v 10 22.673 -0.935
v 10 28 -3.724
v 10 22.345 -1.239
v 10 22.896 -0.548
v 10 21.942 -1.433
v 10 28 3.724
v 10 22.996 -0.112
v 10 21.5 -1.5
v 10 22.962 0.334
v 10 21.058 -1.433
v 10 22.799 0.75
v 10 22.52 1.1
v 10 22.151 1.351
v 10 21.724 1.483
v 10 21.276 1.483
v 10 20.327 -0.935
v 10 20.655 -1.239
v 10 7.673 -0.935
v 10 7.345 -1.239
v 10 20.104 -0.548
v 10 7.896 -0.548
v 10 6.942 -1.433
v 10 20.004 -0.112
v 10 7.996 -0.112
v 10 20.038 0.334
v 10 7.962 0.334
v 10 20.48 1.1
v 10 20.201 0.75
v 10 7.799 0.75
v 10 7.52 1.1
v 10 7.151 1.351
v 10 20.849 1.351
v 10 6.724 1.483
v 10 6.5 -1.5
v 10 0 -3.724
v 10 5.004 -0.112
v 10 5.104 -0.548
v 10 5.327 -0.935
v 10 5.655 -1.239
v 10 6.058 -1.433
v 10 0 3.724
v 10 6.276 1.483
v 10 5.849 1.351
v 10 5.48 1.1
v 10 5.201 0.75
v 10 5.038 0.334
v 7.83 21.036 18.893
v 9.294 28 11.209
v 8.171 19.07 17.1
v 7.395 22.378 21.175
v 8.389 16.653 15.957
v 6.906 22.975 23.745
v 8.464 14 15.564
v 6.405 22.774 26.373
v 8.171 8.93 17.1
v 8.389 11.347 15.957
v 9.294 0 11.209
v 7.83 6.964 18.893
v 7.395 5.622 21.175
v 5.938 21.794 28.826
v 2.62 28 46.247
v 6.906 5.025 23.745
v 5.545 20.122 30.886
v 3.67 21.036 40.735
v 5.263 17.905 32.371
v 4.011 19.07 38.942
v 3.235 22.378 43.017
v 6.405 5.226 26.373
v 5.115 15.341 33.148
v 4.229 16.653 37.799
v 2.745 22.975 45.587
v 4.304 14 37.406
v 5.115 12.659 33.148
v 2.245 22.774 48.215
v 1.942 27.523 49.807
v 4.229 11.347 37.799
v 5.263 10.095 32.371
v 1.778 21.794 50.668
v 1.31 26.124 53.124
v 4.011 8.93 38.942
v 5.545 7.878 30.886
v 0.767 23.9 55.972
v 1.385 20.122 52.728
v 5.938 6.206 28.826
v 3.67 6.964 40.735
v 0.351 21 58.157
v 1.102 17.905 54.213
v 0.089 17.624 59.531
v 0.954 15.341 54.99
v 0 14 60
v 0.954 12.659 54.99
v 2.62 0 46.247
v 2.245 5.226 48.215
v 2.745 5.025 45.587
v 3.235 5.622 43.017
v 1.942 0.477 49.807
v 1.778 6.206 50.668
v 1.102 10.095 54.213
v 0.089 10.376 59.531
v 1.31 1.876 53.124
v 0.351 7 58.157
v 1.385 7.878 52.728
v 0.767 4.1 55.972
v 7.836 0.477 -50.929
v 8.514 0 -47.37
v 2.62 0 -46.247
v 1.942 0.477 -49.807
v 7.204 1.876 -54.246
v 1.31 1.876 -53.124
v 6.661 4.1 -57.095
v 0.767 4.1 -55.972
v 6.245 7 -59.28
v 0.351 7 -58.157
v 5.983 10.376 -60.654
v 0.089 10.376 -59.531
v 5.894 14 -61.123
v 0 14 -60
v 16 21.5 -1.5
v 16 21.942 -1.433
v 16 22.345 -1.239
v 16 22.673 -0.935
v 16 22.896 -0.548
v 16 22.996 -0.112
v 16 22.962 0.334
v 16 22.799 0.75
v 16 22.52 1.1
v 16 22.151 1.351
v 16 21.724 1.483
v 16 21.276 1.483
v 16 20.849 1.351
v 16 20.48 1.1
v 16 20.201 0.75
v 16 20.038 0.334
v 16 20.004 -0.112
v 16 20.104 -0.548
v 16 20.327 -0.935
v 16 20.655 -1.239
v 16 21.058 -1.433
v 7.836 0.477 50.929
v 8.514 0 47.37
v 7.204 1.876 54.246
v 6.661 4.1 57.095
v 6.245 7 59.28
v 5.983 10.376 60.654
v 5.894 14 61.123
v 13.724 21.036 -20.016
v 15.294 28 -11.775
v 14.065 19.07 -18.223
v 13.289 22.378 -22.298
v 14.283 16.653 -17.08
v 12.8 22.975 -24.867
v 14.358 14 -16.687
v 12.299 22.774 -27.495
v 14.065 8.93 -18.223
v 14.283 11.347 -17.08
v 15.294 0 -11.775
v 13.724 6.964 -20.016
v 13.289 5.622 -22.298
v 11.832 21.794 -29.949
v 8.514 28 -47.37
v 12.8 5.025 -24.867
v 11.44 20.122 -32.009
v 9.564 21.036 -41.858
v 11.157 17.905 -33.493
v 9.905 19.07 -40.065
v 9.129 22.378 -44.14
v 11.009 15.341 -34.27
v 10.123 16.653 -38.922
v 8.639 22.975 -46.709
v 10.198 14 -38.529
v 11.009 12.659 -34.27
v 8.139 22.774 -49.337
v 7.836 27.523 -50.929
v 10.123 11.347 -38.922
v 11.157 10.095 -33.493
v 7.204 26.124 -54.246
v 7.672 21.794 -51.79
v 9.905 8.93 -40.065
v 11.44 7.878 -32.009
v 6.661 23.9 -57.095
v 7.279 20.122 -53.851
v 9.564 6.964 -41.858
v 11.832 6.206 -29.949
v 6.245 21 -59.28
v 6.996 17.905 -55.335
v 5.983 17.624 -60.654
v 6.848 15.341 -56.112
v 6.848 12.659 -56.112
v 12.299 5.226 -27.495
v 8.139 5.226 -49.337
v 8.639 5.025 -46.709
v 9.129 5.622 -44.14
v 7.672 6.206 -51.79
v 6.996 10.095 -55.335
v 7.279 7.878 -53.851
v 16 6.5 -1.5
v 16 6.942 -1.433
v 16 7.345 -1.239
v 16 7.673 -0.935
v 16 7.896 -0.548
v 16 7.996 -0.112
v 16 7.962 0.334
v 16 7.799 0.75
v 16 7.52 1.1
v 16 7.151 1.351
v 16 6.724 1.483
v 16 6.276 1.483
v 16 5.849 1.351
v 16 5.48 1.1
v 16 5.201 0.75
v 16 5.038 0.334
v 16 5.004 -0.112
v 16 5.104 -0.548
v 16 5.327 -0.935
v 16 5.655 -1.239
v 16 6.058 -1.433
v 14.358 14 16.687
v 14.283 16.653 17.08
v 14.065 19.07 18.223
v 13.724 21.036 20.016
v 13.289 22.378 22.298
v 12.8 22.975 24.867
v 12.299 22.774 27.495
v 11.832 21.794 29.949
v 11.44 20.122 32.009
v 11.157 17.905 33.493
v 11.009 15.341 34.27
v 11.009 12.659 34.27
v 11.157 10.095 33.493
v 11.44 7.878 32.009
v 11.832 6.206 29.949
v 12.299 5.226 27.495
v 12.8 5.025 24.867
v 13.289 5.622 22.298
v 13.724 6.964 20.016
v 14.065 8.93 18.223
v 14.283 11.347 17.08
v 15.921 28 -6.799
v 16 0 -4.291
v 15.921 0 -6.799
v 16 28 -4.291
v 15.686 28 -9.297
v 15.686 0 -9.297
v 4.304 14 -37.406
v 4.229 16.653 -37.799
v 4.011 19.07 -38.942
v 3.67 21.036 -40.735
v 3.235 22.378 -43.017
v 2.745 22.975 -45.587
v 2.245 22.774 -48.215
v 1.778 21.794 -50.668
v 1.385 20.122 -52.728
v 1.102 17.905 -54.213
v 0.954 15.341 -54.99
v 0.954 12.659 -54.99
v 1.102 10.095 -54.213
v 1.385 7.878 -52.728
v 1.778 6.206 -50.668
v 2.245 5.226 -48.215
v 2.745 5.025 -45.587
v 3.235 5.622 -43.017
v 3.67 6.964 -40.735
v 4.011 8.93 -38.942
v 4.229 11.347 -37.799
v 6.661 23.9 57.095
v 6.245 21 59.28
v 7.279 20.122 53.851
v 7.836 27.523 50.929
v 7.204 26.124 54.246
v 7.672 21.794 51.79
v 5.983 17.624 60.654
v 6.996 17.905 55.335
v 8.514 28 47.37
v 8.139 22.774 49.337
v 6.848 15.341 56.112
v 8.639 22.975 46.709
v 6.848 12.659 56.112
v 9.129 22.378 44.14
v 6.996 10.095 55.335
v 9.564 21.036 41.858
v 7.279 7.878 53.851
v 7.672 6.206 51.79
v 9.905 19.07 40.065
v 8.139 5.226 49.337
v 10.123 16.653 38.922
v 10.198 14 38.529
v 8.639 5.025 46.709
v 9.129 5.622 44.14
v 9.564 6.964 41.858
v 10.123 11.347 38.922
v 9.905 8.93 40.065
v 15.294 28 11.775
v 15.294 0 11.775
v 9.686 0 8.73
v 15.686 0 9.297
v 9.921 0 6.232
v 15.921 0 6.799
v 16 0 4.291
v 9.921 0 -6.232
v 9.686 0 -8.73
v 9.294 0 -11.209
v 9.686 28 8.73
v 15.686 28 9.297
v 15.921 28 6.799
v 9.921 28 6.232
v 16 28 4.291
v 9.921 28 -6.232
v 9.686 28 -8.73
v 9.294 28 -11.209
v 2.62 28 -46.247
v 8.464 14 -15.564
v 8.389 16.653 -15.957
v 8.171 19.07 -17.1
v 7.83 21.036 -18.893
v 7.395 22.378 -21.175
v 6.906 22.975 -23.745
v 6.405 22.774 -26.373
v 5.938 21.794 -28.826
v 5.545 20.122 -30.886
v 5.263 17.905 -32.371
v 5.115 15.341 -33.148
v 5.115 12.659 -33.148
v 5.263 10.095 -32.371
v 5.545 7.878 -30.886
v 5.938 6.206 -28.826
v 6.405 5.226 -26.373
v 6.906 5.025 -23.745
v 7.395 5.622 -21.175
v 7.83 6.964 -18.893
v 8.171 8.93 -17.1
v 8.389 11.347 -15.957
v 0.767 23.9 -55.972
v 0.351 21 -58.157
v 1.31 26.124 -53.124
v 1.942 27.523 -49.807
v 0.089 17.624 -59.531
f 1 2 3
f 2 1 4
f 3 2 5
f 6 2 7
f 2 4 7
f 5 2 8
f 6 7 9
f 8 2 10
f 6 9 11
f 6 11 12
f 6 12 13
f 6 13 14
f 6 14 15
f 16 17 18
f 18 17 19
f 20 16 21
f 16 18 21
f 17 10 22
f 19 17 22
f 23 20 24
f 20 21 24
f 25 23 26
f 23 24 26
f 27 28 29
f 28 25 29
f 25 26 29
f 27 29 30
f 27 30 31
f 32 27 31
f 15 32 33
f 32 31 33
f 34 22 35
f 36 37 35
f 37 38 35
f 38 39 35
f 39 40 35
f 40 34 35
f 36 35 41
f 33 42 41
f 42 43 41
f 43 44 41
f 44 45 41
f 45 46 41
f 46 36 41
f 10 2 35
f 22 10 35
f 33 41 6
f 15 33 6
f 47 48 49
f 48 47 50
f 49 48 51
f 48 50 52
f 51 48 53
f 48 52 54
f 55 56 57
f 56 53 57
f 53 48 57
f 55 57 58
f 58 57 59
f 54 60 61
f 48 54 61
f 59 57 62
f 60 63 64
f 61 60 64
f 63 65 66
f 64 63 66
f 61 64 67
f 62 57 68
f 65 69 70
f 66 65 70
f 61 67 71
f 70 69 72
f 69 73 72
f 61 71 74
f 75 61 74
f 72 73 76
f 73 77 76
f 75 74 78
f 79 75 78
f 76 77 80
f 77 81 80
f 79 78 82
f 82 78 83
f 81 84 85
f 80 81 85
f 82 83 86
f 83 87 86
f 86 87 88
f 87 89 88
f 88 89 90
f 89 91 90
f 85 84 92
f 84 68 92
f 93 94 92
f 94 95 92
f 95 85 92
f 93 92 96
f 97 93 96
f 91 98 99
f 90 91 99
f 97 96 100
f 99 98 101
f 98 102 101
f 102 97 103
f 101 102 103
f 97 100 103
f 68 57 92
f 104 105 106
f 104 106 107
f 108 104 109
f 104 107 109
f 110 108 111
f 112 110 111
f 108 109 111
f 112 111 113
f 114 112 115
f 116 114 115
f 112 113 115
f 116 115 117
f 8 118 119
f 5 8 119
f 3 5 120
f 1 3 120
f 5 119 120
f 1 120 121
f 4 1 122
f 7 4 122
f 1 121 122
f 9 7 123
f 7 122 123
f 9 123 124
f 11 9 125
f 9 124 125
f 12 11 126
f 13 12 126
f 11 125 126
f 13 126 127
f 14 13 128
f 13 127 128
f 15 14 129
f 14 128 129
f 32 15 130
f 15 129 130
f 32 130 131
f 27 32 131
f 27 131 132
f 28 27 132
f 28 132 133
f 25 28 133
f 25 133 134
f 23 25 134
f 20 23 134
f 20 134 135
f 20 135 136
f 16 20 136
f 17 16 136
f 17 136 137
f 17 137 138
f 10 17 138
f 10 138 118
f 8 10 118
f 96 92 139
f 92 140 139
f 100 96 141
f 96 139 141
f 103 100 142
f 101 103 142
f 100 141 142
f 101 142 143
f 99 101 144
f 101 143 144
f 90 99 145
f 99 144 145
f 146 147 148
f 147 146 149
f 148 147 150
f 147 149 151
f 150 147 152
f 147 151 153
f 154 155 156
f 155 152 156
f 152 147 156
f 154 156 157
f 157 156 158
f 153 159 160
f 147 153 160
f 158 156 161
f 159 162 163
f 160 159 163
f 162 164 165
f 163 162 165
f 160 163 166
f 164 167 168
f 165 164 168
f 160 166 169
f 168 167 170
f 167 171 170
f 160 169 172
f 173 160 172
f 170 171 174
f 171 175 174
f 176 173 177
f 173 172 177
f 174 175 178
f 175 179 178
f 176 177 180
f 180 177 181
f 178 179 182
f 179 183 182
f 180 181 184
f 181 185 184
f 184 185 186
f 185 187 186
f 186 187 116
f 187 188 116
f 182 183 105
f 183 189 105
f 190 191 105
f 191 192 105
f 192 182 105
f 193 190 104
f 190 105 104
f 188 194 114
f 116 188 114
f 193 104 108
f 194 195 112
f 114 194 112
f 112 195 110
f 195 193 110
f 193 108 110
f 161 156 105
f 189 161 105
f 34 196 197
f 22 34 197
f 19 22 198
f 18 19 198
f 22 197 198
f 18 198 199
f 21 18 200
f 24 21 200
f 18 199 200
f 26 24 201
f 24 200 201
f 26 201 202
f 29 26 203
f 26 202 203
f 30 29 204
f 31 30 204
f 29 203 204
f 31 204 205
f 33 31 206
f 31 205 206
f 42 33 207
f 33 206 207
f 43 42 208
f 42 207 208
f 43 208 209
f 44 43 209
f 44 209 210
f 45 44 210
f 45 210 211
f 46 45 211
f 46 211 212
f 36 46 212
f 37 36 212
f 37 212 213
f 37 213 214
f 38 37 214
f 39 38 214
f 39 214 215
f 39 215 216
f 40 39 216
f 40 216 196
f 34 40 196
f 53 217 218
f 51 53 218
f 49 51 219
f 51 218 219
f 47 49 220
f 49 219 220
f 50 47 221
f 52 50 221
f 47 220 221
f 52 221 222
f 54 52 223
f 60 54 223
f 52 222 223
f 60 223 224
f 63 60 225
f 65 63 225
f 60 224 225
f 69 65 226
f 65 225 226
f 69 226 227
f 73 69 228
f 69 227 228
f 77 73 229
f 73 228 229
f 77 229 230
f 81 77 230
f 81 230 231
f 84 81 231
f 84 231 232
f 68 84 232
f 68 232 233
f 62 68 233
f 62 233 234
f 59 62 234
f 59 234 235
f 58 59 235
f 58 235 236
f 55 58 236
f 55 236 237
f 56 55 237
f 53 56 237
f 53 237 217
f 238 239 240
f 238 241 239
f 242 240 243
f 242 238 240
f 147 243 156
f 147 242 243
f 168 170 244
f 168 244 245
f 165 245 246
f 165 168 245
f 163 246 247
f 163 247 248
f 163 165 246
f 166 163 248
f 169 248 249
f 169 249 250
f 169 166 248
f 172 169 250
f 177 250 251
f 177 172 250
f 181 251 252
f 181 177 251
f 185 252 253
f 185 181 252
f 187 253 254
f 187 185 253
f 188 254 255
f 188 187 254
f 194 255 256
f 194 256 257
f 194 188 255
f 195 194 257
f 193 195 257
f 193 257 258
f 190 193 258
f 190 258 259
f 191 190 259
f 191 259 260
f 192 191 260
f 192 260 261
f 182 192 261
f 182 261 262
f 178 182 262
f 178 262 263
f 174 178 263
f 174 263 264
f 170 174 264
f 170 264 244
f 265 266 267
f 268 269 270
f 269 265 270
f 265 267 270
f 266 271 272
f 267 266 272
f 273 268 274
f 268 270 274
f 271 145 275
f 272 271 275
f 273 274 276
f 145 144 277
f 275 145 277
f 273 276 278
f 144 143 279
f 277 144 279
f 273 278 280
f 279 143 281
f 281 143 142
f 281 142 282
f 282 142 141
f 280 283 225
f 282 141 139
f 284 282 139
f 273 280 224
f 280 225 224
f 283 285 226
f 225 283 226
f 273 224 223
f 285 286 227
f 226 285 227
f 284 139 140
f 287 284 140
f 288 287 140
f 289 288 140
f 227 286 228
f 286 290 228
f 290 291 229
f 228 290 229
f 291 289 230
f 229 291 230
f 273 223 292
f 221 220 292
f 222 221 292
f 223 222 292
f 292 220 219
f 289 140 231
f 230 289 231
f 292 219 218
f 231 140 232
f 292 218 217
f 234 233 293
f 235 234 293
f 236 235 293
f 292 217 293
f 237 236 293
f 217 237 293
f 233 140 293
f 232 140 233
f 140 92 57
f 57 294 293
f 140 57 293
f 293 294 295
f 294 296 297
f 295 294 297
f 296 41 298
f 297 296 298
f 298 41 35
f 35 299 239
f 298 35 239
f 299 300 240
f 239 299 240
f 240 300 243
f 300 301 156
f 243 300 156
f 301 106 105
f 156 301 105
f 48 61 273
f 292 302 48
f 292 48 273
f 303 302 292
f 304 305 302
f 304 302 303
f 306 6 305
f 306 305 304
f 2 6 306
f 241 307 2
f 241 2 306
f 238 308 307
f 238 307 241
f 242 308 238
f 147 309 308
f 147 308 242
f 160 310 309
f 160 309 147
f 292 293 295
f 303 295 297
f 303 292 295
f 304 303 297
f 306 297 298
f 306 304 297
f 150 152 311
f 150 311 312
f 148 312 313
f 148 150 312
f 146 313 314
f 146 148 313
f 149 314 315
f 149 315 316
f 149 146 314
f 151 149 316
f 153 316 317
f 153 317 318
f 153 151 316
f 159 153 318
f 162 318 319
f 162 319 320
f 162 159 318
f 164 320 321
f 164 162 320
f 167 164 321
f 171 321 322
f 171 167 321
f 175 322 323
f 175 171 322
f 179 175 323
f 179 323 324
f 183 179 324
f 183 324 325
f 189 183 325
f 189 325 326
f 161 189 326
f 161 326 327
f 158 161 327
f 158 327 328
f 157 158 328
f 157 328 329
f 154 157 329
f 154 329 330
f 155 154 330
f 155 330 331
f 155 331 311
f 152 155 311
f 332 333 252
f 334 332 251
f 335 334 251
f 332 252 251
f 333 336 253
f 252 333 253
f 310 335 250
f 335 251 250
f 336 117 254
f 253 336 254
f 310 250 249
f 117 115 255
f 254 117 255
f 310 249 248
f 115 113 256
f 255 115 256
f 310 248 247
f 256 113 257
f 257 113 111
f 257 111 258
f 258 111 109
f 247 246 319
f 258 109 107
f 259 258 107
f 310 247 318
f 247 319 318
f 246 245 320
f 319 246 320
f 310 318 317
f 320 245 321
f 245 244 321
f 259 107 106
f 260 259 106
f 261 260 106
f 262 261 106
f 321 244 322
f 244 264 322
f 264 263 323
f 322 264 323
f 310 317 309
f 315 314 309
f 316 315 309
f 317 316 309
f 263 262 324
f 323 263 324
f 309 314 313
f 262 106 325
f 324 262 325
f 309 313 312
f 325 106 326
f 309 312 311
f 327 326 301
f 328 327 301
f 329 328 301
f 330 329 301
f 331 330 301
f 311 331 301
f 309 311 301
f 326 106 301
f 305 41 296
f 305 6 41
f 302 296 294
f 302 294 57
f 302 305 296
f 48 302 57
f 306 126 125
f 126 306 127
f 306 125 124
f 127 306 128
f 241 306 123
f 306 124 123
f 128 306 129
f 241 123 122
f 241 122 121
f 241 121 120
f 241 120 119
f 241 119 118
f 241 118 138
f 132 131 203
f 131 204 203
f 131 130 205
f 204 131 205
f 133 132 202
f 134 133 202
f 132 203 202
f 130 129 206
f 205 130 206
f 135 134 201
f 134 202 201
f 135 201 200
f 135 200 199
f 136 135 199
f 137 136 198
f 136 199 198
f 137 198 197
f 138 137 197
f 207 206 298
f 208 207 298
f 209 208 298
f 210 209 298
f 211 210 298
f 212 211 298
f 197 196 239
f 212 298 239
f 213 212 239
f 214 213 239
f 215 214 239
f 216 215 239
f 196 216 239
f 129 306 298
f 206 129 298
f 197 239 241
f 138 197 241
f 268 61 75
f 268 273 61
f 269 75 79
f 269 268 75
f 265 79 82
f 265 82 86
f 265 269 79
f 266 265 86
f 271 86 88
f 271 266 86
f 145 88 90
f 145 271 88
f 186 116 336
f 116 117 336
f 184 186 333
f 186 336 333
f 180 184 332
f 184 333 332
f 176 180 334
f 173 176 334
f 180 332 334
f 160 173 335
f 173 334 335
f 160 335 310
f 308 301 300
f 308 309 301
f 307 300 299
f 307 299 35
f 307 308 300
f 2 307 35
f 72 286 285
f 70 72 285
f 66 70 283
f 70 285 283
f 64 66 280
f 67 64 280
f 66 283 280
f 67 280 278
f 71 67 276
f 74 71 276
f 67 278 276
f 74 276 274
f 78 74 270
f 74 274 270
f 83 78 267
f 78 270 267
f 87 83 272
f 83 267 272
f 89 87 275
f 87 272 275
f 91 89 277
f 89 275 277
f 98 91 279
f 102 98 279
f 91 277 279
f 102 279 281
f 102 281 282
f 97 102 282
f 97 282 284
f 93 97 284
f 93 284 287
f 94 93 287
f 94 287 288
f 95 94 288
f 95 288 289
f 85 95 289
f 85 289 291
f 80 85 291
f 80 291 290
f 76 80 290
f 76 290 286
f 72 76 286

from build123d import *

# Parameters (mm, degrees)
BOSS_EXTRUDE1_DEPTH = 28
FILLET1_R           = 40
CUT_EXTRUDE1_REACH  = 74.186
SKETCH2_R           = 9
CUT_EXTRUDE2_REACH  = 71.108
SKETCH3_R           = 1.5
FILLET2_R           = 14


with BuildPart() as part:
    # Sketch1 → Boss-Extrude1 (new body)
    with BuildSketch(Plane(origin=(0, 0, 0), x_dir=(1, 0, 0), z_dir=(0, 1, 0))):
        Polygon((0, 60), (10, 7.5), (10, -7.5), (0, -60), (5.894031399, -61.122672647), (16, -8.06633749), (16, 8.06633749), (5.894031399, 61.122672647), align=None)
    extrude(amount=BOSS_EXTRUDE1_DEPTH)

    # Fillet1
    fillet1_edges = [part.edges().sort_by_distance(p)[0] for p in [
        (10, 14, 7.5),
        (10, 14, -7.5),
        (16, 14, -8.06633749),
        (16, 14, 8.06633749),
    ]]
    fillet(fillet1_edges, radius=FILLET1_R)

    # Sketch2 → Cut-Extrude1 (cut, up to next)
    with BuildSketch(Plane(origin=(16.922477788, 0, 3.223329102), x_dir=(0.1871121078899954, 0, -0.9823385664224749), z_dir=(0.9823385664224749, 0, 0.1871121078899954)), mode=Mode.PRIVATE) as cut_extrude1_sk1:
        with Locations((-44.940313985, 14)):
            Circle(SKETCH2_R)
    cut_extrude1_tool1 = extrude(cut_extrude1_sk1.sketch, amount=-CUT_EXTRUDE1_REACH, mode=Mode.PRIVATE) & part.part
    # Sketch2 → Cut-Extrude1 (cut, up to next)
    with BuildSketch(Plane(origin=(16.922477788, 0, 3.223329102), x_dir=(0.1871121078899954, 0, -0.9823385664224749), z_dir=(0.9823385664224749, 0, 0.1871121078899954)), mode=Mode.PRIVATE) as cut_extrude1_sk2:
        with Locations((-22.705663944, 14)):
            Circle(SKETCH2_R)
    cut_extrude1_tool2 = extrude(cut_extrude1_sk2.sketch, amount=-CUT_EXTRUDE1_REACH, mode=Mode.PRIVATE) & part.part
    cut_extrude1_1 = cut_extrude1_tool1.solids().sort_by_distance((8.513601, 14, 47.369933))[0]
    add(cut_extrude1_1, mode=Mode.SUBTRACT)
    cut_extrude1_2 = cut_extrude1_tool2.solids().sort_by_distance((12.673973, 14, 25.527978))[0]
    add(cut_extrude1_2, mode=Mode.SUBTRACT)
    cut_extrude1 = cut_extrude1_1 + cut_extrude1_2  # Cut-Extrude1 as one shape, for the pattern or mirror that repeats it

    # Mirror1: Cut-Extrude1 across plane
    add(cut_extrude1.mirror(Plane.XY), mode=Mode.SUBTRACT)

    # Sketch3 → Cut-Extrude2 (cut, up to next)
    with BuildSketch(Plane(origin=(16, 0, 0), x_dir=(0, 0, -1), z_dir=(1, 0, 0)), mode=Mode.PRIVATE) as cut_extrude2_sk1:
        with Locations((0, 21.5)):
            Circle(SKETCH3_R)
    cut_extrude2_tool1 = extrude(cut_extrude2_sk1.sketch, amount=-CUT_EXTRUDE2_REACH, mode=Mode.PRIVATE) & part.part
    # Sketch3 → Cut-Extrude2 (cut, up to next)
    with BuildSketch(Plane(origin=(16, 0, 0), x_dir=(0, 0, -1), z_dir=(1, 0, 0)), mode=Mode.PRIVATE) as cut_extrude2_sk2:
        with Locations((0, 6.5)):
            Circle(SKETCH3_R)
    cut_extrude2_tool2 = extrude(cut_extrude2_sk2.sketch, amount=-CUT_EXTRUDE2_REACH, mode=Mode.PRIVATE) & part.part
    add(cut_extrude2_tool1.solids().sort_by_distance((16, 21.5, 0))[0], mode=Mode.SUBTRACT)
    add(cut_extrude2_tool2.solids().sort_by_distance((16, 6.5, 0))[0], mode=Mode.SUBTRACT)

    # Fillet2
    fillet2_edges = [part.edges().sort_by_distance(p)[0] for p in [
        (2.947015699, 0, -60.561336324),
        (2.947015699, 28, -60.561336324),
        (2.947015699, 0, 60.561336324),
        (2.947015699, 28, 60.561336324),
    ]]
    fillet(fillet2_edges, radius=FILLET2_R - 0.0001)  # a hair under: the kernel refuses the full size


solid = part.part
